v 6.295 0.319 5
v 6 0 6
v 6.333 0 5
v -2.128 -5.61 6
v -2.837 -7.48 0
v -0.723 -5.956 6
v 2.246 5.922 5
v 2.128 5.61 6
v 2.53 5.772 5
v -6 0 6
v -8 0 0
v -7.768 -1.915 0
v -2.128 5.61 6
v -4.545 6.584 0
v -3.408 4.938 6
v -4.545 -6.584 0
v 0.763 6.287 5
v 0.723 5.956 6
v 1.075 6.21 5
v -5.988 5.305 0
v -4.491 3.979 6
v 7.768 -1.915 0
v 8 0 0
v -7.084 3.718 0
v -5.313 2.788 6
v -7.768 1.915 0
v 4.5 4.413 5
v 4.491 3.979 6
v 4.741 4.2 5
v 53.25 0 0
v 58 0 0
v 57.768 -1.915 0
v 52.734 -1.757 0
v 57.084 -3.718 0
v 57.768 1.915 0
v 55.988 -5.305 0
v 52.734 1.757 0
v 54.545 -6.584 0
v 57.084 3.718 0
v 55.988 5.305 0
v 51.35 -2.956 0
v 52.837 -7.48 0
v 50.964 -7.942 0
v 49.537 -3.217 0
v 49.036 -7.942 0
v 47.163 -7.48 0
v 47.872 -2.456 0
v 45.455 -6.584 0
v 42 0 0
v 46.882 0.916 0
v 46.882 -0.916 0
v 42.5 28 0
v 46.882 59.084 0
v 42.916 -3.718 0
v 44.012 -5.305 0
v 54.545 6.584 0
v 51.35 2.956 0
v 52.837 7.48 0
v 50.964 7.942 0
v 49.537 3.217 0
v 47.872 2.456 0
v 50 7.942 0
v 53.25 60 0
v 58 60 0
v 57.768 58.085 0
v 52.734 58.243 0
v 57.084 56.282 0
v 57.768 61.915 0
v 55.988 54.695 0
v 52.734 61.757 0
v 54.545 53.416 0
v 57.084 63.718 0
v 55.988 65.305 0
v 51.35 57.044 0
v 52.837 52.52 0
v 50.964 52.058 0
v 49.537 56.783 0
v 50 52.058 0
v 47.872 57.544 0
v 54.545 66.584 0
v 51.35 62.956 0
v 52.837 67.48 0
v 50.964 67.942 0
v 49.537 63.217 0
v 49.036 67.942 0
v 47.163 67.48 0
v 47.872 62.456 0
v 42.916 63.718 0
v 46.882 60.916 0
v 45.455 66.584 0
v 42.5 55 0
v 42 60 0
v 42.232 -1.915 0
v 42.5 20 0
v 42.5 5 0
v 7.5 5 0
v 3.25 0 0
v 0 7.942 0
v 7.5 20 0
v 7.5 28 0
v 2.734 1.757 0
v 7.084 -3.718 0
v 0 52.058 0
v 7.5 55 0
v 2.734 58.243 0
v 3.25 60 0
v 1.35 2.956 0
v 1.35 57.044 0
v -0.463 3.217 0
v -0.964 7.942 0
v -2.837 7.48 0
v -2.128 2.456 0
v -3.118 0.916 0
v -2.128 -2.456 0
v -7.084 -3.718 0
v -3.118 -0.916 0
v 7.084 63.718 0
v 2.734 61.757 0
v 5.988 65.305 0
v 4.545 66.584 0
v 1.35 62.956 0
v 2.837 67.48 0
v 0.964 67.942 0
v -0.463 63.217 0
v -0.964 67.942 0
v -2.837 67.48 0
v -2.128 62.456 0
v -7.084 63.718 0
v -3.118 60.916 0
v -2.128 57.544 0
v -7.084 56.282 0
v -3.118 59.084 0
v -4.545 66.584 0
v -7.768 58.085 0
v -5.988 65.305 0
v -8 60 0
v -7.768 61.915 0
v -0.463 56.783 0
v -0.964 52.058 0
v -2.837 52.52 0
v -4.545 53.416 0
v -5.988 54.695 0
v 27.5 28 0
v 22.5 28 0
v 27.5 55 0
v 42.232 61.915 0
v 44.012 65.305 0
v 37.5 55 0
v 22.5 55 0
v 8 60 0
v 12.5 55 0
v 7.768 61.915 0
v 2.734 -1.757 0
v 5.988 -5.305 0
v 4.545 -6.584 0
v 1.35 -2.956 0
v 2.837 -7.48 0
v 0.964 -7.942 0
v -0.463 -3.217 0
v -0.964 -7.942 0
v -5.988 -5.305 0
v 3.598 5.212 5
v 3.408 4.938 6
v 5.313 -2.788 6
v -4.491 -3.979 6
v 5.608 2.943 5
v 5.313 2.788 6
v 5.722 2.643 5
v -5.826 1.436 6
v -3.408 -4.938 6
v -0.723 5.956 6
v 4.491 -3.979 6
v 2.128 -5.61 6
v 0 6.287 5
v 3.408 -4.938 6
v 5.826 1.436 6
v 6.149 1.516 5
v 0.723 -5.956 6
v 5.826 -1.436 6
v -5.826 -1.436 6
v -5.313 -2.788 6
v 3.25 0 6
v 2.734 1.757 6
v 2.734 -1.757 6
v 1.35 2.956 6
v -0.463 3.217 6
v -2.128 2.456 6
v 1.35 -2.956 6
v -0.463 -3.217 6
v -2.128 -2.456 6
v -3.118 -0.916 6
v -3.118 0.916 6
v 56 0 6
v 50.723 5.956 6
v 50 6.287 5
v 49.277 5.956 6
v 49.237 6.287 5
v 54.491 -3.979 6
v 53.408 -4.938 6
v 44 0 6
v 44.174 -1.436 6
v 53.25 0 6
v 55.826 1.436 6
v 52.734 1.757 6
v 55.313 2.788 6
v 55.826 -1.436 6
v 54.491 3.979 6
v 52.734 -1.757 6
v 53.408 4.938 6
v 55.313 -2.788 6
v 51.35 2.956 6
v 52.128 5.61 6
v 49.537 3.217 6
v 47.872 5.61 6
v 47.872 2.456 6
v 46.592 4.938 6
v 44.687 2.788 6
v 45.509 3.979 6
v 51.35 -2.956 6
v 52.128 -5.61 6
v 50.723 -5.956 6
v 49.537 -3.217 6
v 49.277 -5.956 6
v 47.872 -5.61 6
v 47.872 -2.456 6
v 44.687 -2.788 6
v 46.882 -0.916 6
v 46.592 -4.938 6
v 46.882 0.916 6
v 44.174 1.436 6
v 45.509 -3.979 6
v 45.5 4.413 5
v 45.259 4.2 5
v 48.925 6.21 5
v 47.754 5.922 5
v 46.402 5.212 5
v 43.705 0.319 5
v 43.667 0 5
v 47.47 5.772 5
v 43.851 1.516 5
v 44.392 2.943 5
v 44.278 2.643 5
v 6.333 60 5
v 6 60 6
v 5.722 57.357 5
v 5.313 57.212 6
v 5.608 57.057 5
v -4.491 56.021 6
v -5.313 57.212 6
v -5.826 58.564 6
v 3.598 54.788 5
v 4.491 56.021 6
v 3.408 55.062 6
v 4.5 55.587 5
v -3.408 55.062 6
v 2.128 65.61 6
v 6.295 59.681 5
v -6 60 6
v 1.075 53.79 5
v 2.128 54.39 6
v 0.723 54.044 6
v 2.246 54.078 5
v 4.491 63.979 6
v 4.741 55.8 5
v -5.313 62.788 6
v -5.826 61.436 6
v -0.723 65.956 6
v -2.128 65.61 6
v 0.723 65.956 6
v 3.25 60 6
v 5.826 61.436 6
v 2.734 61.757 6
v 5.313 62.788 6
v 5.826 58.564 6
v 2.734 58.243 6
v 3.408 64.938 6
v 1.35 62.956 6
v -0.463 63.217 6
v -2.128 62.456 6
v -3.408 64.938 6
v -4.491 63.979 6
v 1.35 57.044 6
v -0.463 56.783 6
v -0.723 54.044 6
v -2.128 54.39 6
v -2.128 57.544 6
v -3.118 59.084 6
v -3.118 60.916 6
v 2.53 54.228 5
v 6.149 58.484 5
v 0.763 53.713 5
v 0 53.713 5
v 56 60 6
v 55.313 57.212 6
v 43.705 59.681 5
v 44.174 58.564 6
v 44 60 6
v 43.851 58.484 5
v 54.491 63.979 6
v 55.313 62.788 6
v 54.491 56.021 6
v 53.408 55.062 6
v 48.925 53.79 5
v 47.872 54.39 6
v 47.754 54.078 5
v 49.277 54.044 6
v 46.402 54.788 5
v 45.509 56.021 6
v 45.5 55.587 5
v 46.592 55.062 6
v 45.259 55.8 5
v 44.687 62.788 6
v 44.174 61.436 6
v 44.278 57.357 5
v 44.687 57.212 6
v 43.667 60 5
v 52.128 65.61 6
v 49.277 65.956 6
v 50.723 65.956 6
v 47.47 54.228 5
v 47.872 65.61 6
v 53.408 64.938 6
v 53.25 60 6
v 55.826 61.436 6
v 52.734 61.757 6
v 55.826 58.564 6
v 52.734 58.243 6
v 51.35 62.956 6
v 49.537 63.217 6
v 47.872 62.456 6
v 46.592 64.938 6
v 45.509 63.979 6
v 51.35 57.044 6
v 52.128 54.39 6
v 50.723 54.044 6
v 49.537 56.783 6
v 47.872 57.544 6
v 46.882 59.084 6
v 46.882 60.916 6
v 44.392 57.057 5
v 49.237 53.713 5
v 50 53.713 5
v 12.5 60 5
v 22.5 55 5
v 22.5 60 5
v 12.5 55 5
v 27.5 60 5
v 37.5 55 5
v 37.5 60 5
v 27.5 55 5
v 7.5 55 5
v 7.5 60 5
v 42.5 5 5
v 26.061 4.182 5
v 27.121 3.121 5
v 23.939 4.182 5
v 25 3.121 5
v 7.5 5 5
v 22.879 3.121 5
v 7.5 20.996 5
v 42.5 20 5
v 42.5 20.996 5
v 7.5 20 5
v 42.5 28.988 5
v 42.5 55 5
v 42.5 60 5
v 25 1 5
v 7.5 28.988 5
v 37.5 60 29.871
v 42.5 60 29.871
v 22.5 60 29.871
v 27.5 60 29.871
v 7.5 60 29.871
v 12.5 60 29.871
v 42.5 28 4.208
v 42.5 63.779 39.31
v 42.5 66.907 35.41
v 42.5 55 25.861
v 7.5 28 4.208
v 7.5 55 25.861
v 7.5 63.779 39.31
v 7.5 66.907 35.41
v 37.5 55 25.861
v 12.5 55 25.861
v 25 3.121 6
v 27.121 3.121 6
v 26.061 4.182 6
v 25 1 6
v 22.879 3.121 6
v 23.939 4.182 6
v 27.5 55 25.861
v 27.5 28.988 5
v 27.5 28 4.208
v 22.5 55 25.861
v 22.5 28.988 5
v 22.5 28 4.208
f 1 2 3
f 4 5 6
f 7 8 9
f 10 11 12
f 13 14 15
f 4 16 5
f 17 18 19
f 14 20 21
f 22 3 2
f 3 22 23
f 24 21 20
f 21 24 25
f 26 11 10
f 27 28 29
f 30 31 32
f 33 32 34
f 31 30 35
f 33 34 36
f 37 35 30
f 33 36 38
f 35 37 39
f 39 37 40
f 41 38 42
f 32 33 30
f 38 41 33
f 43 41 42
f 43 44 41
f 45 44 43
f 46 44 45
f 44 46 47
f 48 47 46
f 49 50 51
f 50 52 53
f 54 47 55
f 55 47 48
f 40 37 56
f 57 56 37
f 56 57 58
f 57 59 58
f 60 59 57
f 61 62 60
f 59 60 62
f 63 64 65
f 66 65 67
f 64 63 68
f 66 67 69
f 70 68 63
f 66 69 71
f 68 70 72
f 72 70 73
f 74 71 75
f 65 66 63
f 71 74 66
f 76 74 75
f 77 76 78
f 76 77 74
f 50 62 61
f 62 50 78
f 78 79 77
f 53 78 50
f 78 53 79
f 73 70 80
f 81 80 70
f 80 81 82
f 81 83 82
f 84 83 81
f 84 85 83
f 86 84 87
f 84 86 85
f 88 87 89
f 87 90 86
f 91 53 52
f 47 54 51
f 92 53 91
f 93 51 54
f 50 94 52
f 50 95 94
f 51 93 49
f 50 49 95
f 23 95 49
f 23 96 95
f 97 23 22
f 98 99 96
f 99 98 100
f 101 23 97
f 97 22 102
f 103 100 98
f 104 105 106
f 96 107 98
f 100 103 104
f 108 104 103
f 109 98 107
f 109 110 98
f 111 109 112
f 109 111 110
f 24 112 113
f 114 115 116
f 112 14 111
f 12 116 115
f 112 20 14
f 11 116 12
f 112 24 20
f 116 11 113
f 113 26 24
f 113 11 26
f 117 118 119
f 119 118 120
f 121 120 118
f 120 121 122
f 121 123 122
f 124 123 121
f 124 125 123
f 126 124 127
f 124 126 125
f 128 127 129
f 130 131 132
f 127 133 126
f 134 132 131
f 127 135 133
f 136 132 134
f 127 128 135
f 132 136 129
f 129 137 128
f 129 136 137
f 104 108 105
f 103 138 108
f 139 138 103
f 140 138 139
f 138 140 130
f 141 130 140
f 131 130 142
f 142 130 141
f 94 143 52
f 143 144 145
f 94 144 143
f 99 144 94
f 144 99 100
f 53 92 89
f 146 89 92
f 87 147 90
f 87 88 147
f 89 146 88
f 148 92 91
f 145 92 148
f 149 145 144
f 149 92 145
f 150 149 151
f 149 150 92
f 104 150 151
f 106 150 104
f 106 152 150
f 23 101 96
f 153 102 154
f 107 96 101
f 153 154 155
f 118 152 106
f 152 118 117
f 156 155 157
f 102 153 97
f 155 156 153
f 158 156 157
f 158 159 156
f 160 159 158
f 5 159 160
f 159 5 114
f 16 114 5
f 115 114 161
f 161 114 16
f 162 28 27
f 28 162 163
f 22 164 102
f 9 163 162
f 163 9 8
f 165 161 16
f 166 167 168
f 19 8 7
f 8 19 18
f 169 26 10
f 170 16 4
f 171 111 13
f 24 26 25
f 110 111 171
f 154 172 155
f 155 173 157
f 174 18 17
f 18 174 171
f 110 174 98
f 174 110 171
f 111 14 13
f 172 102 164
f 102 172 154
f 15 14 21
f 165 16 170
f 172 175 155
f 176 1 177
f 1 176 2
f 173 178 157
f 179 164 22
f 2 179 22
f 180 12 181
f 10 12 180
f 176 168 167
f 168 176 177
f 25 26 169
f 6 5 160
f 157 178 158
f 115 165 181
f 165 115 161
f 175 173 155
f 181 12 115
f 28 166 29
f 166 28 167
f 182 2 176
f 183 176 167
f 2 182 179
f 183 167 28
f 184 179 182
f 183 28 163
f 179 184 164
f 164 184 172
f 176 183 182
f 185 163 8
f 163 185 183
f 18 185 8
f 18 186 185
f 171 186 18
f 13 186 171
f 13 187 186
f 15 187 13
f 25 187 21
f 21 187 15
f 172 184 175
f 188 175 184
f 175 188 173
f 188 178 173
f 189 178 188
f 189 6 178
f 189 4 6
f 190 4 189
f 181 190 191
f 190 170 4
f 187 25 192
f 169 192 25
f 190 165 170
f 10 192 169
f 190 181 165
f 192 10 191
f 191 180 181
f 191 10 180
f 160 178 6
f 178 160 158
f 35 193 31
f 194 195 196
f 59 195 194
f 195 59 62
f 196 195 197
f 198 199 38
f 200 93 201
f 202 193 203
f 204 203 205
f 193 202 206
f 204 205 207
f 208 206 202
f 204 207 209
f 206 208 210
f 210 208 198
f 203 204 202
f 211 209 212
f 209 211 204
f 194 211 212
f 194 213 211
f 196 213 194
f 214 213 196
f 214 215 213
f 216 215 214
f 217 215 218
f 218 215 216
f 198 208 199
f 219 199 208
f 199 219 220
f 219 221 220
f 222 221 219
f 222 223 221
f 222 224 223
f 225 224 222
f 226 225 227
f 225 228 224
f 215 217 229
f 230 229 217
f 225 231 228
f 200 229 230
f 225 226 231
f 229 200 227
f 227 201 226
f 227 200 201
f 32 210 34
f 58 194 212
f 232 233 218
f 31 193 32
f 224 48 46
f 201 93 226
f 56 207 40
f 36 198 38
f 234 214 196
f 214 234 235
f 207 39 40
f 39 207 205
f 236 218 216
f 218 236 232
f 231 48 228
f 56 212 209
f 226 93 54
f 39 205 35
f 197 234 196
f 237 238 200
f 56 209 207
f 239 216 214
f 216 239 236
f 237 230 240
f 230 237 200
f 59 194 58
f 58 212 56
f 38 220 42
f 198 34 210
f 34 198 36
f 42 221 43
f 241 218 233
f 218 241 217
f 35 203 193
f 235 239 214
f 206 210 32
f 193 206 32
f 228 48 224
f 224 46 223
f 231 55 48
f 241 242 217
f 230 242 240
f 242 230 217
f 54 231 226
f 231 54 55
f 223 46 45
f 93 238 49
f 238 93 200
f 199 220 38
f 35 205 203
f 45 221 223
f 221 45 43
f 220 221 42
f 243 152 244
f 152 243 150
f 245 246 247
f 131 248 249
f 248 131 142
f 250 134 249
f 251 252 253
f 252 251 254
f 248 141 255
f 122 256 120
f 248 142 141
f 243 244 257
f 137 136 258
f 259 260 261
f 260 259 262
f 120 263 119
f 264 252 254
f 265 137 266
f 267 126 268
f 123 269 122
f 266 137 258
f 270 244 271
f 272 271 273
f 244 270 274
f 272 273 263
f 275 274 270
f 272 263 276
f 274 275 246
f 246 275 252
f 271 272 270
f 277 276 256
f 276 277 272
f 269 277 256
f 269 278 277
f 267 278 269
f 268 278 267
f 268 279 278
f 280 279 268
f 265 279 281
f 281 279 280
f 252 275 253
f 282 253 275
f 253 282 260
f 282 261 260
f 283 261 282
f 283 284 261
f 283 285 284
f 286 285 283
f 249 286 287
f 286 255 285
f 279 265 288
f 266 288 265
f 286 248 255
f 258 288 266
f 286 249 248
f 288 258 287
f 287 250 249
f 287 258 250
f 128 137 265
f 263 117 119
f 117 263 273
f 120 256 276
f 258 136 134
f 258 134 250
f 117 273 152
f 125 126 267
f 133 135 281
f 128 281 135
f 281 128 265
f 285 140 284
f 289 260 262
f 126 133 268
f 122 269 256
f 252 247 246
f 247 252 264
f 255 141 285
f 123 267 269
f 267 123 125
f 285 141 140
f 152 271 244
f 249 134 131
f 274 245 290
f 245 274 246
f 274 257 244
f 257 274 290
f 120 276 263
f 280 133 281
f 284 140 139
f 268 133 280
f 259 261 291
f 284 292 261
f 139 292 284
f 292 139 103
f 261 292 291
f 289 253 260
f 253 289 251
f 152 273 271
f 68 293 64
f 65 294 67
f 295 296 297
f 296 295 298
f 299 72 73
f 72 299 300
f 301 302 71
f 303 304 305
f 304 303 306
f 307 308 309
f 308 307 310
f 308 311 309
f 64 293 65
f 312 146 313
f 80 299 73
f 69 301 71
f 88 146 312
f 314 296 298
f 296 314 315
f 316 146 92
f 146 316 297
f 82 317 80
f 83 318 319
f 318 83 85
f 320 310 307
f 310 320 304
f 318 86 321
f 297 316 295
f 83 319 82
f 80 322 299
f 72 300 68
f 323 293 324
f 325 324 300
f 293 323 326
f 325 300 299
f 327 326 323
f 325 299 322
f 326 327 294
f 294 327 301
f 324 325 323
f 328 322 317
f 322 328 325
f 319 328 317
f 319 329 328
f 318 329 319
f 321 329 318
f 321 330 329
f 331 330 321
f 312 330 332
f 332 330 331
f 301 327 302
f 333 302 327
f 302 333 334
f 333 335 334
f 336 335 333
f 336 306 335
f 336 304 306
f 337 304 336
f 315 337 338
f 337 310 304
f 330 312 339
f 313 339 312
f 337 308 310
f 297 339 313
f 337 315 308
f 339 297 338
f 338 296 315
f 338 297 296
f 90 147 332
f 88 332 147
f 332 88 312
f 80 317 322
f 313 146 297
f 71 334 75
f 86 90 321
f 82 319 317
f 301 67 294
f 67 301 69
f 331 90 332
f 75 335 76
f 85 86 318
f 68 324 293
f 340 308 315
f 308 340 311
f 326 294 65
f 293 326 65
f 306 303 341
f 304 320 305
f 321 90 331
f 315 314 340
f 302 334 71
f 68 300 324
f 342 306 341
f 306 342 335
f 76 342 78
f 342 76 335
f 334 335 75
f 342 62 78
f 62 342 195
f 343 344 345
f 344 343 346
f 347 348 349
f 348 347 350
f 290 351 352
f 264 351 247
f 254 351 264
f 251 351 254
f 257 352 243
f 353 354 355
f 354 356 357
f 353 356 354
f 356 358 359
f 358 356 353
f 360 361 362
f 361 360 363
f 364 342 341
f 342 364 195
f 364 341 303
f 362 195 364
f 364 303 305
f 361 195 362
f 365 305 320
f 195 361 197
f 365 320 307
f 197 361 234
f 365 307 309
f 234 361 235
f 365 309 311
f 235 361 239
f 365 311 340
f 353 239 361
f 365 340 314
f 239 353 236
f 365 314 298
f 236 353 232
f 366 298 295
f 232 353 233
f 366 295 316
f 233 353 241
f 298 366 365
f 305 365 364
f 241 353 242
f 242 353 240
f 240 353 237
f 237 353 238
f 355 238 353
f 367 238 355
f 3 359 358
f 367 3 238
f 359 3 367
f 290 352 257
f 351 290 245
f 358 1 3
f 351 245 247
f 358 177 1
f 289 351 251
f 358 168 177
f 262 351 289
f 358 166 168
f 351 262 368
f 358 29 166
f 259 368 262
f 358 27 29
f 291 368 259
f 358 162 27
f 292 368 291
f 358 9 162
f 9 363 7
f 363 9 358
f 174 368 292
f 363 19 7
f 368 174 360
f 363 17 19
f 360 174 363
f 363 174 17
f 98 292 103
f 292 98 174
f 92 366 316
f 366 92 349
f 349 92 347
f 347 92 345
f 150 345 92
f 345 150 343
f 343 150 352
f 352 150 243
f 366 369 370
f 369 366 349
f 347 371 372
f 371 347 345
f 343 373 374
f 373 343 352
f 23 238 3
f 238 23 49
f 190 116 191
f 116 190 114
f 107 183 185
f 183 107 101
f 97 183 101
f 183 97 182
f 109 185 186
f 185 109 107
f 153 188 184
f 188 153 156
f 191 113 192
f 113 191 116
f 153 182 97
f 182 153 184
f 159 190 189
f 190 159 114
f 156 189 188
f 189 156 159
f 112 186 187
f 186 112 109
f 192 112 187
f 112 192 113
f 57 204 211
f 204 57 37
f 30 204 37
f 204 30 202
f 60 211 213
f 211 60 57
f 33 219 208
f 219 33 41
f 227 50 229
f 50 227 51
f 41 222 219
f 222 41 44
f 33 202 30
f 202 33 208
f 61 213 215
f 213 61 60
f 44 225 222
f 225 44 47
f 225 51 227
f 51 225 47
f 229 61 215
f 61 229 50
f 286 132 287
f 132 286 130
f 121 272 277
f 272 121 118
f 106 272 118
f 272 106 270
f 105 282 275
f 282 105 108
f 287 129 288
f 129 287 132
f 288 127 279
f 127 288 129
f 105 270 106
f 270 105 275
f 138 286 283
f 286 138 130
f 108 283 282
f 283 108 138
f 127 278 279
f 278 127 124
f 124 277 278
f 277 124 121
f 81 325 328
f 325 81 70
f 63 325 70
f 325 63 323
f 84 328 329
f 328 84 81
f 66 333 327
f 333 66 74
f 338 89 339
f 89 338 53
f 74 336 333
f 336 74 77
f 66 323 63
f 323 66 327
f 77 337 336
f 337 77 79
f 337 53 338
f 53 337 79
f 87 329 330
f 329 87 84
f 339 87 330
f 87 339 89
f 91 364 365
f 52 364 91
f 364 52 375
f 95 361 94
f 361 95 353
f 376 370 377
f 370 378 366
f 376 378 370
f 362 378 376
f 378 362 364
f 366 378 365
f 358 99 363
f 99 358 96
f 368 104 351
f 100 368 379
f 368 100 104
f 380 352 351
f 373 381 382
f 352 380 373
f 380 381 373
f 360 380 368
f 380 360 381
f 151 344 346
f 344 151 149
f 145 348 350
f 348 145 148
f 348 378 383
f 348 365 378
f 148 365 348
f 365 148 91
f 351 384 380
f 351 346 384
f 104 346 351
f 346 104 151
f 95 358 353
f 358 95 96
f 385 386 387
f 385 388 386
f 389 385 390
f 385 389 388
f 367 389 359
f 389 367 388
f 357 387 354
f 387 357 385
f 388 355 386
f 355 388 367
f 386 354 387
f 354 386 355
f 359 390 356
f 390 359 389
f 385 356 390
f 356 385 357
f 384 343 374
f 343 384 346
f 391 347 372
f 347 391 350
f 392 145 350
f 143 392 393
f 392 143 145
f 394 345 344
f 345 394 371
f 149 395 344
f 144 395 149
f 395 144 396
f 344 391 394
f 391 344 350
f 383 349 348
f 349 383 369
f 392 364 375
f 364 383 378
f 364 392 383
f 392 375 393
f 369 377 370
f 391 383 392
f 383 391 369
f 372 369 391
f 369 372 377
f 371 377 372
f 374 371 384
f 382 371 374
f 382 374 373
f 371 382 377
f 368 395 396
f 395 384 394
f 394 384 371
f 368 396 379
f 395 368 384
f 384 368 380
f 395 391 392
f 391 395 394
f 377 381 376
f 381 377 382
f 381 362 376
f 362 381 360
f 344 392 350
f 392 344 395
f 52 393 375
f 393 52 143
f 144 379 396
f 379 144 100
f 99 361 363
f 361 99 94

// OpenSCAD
/*
 * openSCAD for a simple Equatorial Wedge to hold the Pan & Tilt camera
 *
 * Copyright 2015 Peter T Mount
 * 
 * Licensed under the Apache License, Version 2.0 (the "License");
 * you may not use this file except in compliance with the License.
 * You may obtain a copy of the License at
 * 
 * http://www.apache.org/licenses/LICENSE-2.0
 * 
 * Unless required by applicable law or agreed to in writing, software
 * distributed under the License is distributed on an "AS IS" BASIS,
 * WITHOUT WARRANTIES OR CONDITIONS OF ANY KIND, either express or implied.
 * See the License for the specific language governing permissions and
 * limitations under the License.
 *
 */

// The required latitude in degrees.
// Note:
//  1 this is a positive value, so 51.5N and 51.5S is still 51.5 here.
//  2 There's a bug in the math for latitudes 25 to 35 where the supports
//    don't reach the mount plate. You may have to modify the height manually
latitude=51.271749;

/* **********************************
 * * Do not modify below this point *
 * **********************************/

// Base plate to attach to the exterior case
difference() {
	union() {
		cube([50,60,5]);
		// Bolt mounts
		for(c=[0:3])
			translate([50*(c%2),60*(floor(c/2)%2),0])
			cylinder(h=6,r1=8,r2=6);
	}
	translate([7.5,5,-1]) cube([35,50,7]);

	// Bolt holes
	for(c=[0:3])
		translate([50*(c%2),60*(floor(c/2)%2),0])
		translate([0,0,-1]) cylinder(h=8,r=3.25);
}

// Add marker to point to the pole
translate([25,1,4]) {
	rotate([0,0,45]) cube([3,1.5,2]);
	rotate([0,0,-45]) translate([-3,0,0]) cube([3,1.5,2]);
}

// The camera mount plate
translate([0,20,0]) assign(
	alpha=90-latitude,
	height=55*sin(90-latitude),
	offset=55*cos(90-latitude)//-7.5
) {
	// Mount plate
	translate([7.5,4,1])
		rotate([alpha,0,0])
		cube([35,55,5]);

	// Front mount
	translate([7.5,0,0]) cube([35,8,5]);

	// Rear mount - usually part of rear of basePlate but accounts for
	// lower latitudes when it's closer to the front
	//translate([7.5,offset,0]) cube([35,5,5]);

	// Center support
	translate([22.5,0,0]) cube([5,35,5]);

	// Risers to rear of the mount plate
	assign( off2=35-offset)
		assign(
			// Height of supports
			h = offset<30 ? sqrt(off2*off2+height*height)*sin(alpha)
				: offset>35 ? sqrt(35*35+height*height)*sin(alpha)
			 	: height,
			// Prevent supports leaning backwards
			a=offset<30?atan(off2/height):0
		)
			for(i=[0,1,2])
				translate([7.5+(15*i),35,0])
					rotate([a,0,0])
					cube([5,5,h]);
}
